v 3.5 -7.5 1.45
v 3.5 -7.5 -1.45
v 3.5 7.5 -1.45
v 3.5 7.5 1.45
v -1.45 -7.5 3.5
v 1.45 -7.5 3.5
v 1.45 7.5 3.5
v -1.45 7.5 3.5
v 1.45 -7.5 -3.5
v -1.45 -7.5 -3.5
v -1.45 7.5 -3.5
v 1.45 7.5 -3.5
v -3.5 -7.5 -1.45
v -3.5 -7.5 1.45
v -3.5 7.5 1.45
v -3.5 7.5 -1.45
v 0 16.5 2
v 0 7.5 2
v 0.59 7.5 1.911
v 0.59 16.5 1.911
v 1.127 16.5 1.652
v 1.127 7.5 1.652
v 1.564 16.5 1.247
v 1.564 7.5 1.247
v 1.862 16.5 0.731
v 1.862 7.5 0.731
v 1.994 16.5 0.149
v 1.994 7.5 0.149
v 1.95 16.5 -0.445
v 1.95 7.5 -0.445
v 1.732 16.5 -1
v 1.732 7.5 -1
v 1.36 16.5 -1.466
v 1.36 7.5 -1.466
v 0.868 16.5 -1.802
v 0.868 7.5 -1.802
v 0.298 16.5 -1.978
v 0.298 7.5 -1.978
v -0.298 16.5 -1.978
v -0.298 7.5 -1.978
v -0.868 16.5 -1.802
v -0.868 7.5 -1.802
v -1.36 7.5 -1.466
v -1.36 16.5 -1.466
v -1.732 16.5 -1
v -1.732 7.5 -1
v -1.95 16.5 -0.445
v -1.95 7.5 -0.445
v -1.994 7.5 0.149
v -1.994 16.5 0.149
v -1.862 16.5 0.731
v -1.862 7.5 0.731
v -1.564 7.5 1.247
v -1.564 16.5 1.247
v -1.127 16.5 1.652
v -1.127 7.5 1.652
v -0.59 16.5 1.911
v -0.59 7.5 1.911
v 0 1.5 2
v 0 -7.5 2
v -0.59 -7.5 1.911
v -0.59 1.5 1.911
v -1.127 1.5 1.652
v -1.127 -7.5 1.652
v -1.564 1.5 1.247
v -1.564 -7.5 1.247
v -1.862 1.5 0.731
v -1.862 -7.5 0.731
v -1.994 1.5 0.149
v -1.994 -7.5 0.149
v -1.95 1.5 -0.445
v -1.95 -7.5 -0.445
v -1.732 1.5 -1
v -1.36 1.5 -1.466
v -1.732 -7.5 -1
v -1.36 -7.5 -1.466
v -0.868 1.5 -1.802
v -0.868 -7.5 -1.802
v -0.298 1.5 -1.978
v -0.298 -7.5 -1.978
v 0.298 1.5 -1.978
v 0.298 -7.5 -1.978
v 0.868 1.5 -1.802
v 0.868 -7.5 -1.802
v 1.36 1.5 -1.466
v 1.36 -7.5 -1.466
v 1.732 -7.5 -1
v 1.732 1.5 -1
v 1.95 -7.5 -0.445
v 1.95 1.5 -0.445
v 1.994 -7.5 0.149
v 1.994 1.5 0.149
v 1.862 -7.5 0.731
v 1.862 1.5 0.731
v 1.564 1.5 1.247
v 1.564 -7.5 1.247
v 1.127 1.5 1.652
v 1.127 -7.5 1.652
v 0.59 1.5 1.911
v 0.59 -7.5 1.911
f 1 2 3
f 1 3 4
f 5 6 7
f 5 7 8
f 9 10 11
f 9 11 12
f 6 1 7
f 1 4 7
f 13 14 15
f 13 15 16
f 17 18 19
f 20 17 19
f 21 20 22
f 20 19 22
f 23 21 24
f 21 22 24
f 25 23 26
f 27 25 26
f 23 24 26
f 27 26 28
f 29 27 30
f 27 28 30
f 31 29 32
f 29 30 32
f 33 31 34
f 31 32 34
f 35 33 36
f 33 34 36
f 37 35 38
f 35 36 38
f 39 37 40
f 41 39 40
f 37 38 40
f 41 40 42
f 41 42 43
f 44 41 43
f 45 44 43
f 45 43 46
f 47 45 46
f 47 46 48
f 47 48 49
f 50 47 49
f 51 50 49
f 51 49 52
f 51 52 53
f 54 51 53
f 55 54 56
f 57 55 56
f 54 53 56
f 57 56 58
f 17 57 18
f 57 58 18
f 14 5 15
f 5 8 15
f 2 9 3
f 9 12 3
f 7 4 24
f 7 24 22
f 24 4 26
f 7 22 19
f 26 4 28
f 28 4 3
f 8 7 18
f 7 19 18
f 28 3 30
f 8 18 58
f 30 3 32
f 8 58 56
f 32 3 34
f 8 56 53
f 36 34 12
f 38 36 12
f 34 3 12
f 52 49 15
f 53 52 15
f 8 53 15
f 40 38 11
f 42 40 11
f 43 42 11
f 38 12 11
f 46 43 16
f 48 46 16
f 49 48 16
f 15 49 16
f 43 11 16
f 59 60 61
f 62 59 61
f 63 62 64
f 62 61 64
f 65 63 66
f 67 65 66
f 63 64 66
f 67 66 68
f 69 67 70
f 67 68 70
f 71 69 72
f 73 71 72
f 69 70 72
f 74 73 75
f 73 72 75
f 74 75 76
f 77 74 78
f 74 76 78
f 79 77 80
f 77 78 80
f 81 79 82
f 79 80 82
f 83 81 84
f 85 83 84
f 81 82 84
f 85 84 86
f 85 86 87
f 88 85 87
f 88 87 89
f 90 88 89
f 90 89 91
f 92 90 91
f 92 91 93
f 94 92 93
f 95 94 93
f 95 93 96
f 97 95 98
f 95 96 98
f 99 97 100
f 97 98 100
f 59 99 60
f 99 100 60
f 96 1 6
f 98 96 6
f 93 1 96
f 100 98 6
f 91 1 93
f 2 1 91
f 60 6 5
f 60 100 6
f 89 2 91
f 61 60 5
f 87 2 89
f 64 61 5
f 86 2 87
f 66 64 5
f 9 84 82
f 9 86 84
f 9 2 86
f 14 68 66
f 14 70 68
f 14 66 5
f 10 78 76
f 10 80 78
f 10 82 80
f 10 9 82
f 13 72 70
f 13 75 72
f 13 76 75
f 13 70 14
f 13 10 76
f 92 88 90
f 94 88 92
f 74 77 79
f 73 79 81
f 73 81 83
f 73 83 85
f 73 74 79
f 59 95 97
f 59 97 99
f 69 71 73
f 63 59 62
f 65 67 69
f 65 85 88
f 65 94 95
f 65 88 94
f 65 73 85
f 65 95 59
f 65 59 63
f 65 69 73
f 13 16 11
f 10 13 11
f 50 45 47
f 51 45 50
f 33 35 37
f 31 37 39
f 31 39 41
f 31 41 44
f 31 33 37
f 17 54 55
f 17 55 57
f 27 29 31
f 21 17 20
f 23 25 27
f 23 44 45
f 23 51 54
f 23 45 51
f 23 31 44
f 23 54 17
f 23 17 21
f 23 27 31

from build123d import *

# Parameters (mm, degrees)
EXTRUSION1_DEPTH        = 7.5
ESQUISSE2_R             = 2
EXTRUSION2_DEPTH        = 9
ESQUISSE3_R             = 2
ENL_V_MAT_EXTRU_1_DEPTH = 9


with BuildPart() as part:
    # Esquisse1 → Extrusion1 (new, symmetric)
    with BuildSketch(Plane(origin=(0, 0, 0), x_dir=(1, 0, 0), z_dir=(0, 1, 0))):
        Polygon((-1.449747468, 3.5), (1.449747468, 3.5), (3.5, 1.449747468), (3.5, -1.449747468), (1.449747468, -3.5), (-1.449747468, -3.5), (-3.5, -1.449747468), (-3.5, 1.449747468), align=None)
    extrude(amount=EXTRUSION1_DEPTH, both=True)

    # Esquisse2 → Extrusion2 (add)
    with BuildSketch(Plane(origin=(0, 7.5, 0), x_dir=(1, 0, 0), z_dir=(0, 1, 0))):
        with Locations(Location((0, 0, 0), (0, 0, 270))):
            Circle(ESQUISSE2_R)
    extrude(amount=EXTRUSION2_DEPTH)

    # Esquisse3 → Enlèv. mat.-Extru.1 (cut)
    with BuildSketch(Plane.XZ.offset(7.5)):
        with Locations(Location((0, 0, 0), (0, 0, 90))):
            Circle(ESQUISSE3_R)
    extrude(amount=-ENL_V_MAT_EXTRU_1_DEPTH, mode=Mode.SUBTRACT)


solid = part.part
